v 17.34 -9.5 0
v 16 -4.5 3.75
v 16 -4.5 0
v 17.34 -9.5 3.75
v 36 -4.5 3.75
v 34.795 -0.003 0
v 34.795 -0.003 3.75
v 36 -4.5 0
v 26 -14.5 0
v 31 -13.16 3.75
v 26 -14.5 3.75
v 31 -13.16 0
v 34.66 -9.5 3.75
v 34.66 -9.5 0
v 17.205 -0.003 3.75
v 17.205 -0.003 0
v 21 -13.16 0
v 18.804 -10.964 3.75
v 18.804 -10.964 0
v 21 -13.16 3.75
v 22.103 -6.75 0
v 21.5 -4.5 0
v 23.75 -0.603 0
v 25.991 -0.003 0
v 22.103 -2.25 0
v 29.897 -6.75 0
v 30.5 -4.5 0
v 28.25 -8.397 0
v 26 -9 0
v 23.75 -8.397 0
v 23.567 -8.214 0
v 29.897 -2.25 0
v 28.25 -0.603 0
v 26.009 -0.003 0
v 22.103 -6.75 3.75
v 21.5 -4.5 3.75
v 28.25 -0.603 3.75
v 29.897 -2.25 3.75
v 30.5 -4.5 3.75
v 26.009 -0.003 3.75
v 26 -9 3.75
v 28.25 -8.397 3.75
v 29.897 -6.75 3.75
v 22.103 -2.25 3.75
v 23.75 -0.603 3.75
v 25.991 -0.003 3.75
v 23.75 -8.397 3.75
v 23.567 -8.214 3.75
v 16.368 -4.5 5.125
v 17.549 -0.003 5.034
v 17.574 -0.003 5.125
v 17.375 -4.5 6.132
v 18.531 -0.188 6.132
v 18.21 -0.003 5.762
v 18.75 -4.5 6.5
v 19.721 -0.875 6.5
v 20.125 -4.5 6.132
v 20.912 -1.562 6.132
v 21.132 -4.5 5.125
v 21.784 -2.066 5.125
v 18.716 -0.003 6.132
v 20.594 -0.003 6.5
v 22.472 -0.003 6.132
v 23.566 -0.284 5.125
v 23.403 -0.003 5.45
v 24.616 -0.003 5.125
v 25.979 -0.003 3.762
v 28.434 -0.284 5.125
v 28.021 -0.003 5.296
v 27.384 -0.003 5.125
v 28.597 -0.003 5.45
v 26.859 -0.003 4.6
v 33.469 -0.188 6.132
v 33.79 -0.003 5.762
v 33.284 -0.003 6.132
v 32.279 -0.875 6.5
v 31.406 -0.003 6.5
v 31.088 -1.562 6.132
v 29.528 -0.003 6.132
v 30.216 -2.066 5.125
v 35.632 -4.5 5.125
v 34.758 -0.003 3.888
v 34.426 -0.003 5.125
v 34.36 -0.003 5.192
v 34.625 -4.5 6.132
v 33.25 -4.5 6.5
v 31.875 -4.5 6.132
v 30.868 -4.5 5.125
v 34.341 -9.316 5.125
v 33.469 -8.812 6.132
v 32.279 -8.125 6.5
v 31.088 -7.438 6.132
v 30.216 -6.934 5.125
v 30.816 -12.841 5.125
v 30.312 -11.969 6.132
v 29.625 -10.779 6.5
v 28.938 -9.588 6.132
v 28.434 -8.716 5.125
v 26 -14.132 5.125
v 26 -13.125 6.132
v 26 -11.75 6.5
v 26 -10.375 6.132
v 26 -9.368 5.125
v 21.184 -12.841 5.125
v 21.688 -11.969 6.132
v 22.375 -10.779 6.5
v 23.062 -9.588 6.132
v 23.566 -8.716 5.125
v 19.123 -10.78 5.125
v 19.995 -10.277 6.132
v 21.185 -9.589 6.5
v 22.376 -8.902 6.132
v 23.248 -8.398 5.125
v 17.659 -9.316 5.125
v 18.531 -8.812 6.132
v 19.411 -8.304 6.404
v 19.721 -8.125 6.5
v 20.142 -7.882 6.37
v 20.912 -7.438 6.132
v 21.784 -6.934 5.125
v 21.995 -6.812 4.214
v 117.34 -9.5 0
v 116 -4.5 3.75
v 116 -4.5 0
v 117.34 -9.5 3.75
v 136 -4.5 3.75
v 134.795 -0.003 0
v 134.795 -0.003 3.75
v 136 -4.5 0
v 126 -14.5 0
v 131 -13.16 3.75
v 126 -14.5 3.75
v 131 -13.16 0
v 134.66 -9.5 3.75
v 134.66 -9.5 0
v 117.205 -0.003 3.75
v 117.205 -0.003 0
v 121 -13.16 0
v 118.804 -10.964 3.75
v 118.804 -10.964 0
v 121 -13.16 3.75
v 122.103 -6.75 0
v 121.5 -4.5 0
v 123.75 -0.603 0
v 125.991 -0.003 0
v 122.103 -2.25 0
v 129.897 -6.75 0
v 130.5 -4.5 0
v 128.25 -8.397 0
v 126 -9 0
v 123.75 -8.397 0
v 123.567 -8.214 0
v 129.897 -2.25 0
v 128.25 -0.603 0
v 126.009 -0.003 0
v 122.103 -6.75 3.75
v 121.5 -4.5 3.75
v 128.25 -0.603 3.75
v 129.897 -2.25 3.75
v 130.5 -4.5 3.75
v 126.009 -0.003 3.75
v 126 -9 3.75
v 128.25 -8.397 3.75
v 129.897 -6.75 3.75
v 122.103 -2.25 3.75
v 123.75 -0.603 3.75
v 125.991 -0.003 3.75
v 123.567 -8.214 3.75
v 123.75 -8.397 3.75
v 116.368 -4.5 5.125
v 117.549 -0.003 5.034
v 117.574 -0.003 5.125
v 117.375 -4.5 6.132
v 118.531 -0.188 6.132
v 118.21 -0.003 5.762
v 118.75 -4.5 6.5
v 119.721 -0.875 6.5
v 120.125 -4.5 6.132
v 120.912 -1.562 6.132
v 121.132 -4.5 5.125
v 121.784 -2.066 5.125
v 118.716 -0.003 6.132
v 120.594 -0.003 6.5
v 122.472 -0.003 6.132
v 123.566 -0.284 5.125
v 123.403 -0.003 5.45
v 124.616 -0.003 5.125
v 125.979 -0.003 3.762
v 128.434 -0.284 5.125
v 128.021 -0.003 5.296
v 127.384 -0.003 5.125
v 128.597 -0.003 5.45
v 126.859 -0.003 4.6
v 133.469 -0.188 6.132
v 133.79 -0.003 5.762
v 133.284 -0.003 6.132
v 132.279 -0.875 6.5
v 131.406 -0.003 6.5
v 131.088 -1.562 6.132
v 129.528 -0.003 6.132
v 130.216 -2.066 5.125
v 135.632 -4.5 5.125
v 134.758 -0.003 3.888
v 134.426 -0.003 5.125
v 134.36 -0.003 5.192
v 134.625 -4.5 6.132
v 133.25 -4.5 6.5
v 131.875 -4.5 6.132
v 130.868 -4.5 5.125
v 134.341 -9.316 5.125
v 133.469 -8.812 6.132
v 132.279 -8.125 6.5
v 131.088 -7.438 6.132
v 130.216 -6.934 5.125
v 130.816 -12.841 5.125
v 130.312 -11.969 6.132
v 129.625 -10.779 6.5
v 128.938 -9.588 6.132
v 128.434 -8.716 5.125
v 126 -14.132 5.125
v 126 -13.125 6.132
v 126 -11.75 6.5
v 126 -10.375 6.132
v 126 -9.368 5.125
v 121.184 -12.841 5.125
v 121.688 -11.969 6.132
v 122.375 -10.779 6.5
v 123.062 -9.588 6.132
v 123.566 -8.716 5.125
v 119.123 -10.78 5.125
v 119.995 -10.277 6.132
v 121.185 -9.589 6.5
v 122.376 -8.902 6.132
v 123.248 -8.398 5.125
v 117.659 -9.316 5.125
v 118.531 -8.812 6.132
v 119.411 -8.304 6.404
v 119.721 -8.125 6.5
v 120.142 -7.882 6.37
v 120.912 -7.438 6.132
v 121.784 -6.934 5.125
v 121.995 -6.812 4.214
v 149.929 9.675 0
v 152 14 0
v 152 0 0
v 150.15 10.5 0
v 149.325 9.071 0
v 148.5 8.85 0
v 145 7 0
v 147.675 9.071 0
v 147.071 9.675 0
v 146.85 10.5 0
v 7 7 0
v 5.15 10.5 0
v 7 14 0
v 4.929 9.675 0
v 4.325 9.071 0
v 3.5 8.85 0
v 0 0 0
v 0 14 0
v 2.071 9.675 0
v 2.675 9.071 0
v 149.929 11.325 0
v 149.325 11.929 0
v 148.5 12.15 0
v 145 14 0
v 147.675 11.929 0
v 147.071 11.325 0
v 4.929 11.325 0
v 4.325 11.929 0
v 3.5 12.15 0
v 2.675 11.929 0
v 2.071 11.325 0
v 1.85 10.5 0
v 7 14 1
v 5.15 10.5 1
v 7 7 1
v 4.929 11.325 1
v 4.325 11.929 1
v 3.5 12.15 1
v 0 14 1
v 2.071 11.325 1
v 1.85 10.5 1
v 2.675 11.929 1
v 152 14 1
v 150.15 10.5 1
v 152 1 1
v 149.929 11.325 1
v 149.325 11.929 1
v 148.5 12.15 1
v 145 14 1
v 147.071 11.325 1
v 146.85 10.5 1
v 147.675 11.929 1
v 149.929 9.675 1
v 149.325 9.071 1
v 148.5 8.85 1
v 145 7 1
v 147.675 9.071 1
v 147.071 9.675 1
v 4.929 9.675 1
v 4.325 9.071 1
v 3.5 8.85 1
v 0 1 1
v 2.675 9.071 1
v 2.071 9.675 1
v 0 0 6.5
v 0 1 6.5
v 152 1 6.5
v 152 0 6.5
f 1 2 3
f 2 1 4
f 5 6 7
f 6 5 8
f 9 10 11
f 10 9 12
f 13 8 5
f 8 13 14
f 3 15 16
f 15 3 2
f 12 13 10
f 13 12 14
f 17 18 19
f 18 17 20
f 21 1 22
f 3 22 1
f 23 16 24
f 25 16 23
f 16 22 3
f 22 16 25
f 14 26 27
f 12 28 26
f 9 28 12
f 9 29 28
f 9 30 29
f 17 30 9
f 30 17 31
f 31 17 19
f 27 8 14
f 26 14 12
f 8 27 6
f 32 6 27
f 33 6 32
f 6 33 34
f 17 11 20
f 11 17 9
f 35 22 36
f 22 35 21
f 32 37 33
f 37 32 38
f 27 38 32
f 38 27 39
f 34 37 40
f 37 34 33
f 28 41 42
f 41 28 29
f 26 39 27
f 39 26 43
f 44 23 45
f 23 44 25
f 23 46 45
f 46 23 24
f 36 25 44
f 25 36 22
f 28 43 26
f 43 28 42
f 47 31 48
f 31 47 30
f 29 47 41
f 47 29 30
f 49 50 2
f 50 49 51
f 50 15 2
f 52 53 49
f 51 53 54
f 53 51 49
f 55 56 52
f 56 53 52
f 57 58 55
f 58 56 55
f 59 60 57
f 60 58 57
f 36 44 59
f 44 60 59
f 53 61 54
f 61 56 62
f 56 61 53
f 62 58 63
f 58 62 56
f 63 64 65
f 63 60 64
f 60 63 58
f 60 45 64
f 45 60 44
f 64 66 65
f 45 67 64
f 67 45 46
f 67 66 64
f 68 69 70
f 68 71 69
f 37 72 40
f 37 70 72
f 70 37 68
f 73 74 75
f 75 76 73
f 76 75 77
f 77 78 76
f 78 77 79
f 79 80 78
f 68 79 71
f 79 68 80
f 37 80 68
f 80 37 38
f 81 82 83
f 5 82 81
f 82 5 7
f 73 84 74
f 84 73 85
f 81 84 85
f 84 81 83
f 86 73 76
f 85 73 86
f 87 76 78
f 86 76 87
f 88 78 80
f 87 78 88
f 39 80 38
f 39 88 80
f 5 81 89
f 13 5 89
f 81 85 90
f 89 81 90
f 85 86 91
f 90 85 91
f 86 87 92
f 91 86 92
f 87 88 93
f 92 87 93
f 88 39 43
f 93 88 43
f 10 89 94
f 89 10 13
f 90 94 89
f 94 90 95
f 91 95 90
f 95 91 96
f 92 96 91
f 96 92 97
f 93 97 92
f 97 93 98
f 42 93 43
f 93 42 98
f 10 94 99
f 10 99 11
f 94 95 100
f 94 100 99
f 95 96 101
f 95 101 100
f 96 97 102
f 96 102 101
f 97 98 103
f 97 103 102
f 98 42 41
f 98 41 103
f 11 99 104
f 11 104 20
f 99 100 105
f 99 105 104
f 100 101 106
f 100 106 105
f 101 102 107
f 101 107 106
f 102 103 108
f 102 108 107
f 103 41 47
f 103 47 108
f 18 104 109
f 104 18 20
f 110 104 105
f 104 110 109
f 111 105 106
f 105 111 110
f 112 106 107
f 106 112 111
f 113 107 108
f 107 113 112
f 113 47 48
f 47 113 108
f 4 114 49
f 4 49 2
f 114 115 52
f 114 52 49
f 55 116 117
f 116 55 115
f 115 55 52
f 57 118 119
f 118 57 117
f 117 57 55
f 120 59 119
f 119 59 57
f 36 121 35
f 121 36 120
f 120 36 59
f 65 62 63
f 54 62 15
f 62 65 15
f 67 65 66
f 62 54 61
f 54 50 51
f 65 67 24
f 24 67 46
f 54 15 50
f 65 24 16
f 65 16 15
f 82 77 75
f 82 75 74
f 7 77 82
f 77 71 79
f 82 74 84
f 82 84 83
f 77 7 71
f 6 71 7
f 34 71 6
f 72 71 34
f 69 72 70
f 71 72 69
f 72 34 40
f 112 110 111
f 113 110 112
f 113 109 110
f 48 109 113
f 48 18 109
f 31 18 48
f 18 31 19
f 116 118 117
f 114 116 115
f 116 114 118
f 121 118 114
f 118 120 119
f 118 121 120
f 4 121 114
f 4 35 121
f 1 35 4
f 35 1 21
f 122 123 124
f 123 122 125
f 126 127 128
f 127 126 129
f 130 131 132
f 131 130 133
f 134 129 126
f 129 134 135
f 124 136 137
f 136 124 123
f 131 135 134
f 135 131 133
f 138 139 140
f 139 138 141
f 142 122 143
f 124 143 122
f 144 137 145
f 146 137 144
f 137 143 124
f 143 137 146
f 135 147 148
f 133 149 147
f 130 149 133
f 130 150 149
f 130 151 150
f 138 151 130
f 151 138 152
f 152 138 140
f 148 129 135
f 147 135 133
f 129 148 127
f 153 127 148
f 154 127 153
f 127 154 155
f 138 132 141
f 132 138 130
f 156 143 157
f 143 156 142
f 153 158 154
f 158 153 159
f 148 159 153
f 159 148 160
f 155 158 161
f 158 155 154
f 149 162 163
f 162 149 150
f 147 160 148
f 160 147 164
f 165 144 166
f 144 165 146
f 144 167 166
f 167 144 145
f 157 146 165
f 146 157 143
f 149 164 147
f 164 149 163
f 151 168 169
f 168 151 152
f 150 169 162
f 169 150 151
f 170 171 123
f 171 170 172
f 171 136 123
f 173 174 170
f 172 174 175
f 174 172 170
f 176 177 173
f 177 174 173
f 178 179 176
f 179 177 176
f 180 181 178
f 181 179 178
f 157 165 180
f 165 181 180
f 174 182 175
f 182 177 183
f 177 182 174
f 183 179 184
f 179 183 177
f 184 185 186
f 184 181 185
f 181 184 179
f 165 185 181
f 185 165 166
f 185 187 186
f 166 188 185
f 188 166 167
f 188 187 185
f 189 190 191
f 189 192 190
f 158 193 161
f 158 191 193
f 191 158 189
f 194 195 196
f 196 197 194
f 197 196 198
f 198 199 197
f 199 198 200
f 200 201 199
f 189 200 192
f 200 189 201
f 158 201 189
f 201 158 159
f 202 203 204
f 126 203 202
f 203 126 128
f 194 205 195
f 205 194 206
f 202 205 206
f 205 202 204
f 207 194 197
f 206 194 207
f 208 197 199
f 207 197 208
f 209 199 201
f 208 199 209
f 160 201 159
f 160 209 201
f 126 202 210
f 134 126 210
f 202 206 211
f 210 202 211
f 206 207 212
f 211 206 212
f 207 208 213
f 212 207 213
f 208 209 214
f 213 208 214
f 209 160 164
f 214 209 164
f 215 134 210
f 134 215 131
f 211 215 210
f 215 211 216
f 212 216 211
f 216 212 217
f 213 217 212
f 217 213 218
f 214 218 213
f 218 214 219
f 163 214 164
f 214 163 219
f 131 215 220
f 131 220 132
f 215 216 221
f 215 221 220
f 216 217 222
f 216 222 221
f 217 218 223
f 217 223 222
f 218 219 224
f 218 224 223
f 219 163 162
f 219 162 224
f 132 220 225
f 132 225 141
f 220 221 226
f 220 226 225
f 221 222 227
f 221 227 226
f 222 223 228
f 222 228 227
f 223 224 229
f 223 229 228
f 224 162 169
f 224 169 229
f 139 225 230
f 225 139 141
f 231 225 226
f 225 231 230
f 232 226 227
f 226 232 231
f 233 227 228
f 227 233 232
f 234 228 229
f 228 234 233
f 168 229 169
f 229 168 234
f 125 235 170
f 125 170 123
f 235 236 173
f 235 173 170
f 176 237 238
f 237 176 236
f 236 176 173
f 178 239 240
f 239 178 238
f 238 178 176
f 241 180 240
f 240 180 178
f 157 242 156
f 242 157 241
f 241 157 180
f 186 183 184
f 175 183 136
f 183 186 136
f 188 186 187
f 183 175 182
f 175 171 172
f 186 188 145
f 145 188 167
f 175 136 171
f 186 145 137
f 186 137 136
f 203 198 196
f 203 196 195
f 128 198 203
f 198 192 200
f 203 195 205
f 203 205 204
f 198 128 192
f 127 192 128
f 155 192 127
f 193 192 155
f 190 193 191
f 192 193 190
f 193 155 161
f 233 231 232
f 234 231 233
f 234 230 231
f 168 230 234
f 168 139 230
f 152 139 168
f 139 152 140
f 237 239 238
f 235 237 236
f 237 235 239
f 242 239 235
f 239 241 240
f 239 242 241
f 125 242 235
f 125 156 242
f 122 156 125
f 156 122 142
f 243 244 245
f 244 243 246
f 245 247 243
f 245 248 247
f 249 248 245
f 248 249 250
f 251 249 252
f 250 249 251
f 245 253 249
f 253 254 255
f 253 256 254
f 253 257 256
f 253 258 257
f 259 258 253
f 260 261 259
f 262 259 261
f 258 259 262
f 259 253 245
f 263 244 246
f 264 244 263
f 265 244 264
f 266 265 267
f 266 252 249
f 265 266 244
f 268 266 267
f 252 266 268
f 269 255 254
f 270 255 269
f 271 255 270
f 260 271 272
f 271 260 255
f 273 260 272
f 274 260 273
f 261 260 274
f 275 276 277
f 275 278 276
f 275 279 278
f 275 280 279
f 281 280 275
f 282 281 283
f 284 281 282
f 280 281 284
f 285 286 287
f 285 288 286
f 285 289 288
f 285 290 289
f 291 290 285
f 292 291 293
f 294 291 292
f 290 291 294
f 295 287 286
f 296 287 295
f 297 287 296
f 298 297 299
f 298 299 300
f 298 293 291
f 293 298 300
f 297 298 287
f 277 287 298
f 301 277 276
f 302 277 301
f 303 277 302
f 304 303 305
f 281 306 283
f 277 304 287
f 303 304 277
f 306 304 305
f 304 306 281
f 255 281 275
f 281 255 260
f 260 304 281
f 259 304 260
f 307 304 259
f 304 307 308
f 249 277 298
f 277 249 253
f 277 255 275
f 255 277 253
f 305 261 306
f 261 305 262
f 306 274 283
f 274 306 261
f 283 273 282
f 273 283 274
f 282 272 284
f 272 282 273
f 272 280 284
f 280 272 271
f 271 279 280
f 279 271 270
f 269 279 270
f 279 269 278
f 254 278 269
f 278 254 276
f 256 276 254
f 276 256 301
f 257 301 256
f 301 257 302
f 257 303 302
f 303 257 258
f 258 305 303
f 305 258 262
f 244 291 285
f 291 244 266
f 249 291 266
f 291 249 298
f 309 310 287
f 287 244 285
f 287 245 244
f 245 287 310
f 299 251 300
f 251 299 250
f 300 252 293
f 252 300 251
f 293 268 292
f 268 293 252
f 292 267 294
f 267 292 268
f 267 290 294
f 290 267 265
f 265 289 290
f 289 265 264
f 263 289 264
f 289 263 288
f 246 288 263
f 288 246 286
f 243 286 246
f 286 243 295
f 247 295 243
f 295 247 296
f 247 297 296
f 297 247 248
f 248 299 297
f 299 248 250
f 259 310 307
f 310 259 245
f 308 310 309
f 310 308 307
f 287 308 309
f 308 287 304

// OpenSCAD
/* filament guide, mountable on display of Prusa i3 Pro B
   presets fit the wood/pertinax 5.5mm frame
*/


// determines depth of beam resting on frame, and consequently, depth of filament eyelets
frame=5.5;                         // [0.5:0.1:15]

mount_screws_separation=145;       // [80:180]

mount_screws_diameter=3;           // [2:0.5:6]

mount_screws_radius=mount_screws_diameter/2;

// distance of screws from upper frame edge
mount_hole_to_beam=9.5;            // [3:0.1:18]

// outer diameter
eyelet_diameter=20;                // [5:0.5:50]

eyelet_radius=eyelet_diameter/2;

// seperate to keep sandwiched display unobstructed by filament
eyelet_seperation=100;             // [10:1:150]

filament_slot_angle=60;            // [-135:135]

filament_slot=2;                   // [1:0.2:5]

// material thickness of beams and tabs
guide_strength=1;                  // [0.5:0.1:4]

guide_vertical_beam=6;             // [0:0.5:16]

guide_vertical_beam_total=guide_vertical_beam+guide_strength;

tabsize=(mount_hole_to_beam+guide_strength-guide_vertical_beam_total)*2;

guide_length = mount_screws_separation+tabsize;

$fn=12;                            // [12:90]

little = 0+0.01;


// r1: inner radius
// r2: outer radius
module torus(r1, r2)  {
        x = (r2+r1)/2;
	y = (r2-r1)/2;
	rotate_extrude(convexity = 10)
	translate([x, y])
	circle(r = y);
}


module tab(size, thickness, bore)  {
	linear_extrude(thickness) {
		difference()  {
			square(size, center=true);
			circle(bore);
		}
	}
}

module eyelet()  {
	difference()  {
		union()  {
			translate([0, 0, guide_strength])
			torus(eyelet_radius-frame, eyelet_radius);
			difference()  {
				cylinder(frame/2+guide_strength, eyelet_radius, eyelet_radius);
				translate([0, 0, -little/2])
				cylinder(frame+guide_strength+little, eyelet_radius-frame, eyelet_radius-frame);
			}
		}

		translate([0, eyelet_radius-frame/2, (frame+guide_strength)/2-little/2])
		cube([eyelet_diameter, frame+little/2, frame+guide_strength+little], center=true);

		rotate([0, 0, 270-filament_slot_angle])
		translate([0, 0, -little/2])
		cube([eyelet_radius, filament_slot, frame+guide_strength+little]);	// filament slot
	}
}




cube([guide_length, guide_vertical_beam_total, guide_strength]);		// vertical beam
cube([guide_length, guide_strength, frame+guide_strength]);			// horizontal beam

for (x=[0:1])  {
	translate([((2*x-1)*mount_screws_separation+guide_length)/2, guide_vertical_beam_total+tabsize/2, 0])
	tab(tabsize, guide_strength, mount_screws_radius*1.1);			// tabs

	translate([((2*x-1)*eyelet_seperation+guide_length)/2, frame-eyelet_radius, 0])
	eyelet();								// eyelets
}
